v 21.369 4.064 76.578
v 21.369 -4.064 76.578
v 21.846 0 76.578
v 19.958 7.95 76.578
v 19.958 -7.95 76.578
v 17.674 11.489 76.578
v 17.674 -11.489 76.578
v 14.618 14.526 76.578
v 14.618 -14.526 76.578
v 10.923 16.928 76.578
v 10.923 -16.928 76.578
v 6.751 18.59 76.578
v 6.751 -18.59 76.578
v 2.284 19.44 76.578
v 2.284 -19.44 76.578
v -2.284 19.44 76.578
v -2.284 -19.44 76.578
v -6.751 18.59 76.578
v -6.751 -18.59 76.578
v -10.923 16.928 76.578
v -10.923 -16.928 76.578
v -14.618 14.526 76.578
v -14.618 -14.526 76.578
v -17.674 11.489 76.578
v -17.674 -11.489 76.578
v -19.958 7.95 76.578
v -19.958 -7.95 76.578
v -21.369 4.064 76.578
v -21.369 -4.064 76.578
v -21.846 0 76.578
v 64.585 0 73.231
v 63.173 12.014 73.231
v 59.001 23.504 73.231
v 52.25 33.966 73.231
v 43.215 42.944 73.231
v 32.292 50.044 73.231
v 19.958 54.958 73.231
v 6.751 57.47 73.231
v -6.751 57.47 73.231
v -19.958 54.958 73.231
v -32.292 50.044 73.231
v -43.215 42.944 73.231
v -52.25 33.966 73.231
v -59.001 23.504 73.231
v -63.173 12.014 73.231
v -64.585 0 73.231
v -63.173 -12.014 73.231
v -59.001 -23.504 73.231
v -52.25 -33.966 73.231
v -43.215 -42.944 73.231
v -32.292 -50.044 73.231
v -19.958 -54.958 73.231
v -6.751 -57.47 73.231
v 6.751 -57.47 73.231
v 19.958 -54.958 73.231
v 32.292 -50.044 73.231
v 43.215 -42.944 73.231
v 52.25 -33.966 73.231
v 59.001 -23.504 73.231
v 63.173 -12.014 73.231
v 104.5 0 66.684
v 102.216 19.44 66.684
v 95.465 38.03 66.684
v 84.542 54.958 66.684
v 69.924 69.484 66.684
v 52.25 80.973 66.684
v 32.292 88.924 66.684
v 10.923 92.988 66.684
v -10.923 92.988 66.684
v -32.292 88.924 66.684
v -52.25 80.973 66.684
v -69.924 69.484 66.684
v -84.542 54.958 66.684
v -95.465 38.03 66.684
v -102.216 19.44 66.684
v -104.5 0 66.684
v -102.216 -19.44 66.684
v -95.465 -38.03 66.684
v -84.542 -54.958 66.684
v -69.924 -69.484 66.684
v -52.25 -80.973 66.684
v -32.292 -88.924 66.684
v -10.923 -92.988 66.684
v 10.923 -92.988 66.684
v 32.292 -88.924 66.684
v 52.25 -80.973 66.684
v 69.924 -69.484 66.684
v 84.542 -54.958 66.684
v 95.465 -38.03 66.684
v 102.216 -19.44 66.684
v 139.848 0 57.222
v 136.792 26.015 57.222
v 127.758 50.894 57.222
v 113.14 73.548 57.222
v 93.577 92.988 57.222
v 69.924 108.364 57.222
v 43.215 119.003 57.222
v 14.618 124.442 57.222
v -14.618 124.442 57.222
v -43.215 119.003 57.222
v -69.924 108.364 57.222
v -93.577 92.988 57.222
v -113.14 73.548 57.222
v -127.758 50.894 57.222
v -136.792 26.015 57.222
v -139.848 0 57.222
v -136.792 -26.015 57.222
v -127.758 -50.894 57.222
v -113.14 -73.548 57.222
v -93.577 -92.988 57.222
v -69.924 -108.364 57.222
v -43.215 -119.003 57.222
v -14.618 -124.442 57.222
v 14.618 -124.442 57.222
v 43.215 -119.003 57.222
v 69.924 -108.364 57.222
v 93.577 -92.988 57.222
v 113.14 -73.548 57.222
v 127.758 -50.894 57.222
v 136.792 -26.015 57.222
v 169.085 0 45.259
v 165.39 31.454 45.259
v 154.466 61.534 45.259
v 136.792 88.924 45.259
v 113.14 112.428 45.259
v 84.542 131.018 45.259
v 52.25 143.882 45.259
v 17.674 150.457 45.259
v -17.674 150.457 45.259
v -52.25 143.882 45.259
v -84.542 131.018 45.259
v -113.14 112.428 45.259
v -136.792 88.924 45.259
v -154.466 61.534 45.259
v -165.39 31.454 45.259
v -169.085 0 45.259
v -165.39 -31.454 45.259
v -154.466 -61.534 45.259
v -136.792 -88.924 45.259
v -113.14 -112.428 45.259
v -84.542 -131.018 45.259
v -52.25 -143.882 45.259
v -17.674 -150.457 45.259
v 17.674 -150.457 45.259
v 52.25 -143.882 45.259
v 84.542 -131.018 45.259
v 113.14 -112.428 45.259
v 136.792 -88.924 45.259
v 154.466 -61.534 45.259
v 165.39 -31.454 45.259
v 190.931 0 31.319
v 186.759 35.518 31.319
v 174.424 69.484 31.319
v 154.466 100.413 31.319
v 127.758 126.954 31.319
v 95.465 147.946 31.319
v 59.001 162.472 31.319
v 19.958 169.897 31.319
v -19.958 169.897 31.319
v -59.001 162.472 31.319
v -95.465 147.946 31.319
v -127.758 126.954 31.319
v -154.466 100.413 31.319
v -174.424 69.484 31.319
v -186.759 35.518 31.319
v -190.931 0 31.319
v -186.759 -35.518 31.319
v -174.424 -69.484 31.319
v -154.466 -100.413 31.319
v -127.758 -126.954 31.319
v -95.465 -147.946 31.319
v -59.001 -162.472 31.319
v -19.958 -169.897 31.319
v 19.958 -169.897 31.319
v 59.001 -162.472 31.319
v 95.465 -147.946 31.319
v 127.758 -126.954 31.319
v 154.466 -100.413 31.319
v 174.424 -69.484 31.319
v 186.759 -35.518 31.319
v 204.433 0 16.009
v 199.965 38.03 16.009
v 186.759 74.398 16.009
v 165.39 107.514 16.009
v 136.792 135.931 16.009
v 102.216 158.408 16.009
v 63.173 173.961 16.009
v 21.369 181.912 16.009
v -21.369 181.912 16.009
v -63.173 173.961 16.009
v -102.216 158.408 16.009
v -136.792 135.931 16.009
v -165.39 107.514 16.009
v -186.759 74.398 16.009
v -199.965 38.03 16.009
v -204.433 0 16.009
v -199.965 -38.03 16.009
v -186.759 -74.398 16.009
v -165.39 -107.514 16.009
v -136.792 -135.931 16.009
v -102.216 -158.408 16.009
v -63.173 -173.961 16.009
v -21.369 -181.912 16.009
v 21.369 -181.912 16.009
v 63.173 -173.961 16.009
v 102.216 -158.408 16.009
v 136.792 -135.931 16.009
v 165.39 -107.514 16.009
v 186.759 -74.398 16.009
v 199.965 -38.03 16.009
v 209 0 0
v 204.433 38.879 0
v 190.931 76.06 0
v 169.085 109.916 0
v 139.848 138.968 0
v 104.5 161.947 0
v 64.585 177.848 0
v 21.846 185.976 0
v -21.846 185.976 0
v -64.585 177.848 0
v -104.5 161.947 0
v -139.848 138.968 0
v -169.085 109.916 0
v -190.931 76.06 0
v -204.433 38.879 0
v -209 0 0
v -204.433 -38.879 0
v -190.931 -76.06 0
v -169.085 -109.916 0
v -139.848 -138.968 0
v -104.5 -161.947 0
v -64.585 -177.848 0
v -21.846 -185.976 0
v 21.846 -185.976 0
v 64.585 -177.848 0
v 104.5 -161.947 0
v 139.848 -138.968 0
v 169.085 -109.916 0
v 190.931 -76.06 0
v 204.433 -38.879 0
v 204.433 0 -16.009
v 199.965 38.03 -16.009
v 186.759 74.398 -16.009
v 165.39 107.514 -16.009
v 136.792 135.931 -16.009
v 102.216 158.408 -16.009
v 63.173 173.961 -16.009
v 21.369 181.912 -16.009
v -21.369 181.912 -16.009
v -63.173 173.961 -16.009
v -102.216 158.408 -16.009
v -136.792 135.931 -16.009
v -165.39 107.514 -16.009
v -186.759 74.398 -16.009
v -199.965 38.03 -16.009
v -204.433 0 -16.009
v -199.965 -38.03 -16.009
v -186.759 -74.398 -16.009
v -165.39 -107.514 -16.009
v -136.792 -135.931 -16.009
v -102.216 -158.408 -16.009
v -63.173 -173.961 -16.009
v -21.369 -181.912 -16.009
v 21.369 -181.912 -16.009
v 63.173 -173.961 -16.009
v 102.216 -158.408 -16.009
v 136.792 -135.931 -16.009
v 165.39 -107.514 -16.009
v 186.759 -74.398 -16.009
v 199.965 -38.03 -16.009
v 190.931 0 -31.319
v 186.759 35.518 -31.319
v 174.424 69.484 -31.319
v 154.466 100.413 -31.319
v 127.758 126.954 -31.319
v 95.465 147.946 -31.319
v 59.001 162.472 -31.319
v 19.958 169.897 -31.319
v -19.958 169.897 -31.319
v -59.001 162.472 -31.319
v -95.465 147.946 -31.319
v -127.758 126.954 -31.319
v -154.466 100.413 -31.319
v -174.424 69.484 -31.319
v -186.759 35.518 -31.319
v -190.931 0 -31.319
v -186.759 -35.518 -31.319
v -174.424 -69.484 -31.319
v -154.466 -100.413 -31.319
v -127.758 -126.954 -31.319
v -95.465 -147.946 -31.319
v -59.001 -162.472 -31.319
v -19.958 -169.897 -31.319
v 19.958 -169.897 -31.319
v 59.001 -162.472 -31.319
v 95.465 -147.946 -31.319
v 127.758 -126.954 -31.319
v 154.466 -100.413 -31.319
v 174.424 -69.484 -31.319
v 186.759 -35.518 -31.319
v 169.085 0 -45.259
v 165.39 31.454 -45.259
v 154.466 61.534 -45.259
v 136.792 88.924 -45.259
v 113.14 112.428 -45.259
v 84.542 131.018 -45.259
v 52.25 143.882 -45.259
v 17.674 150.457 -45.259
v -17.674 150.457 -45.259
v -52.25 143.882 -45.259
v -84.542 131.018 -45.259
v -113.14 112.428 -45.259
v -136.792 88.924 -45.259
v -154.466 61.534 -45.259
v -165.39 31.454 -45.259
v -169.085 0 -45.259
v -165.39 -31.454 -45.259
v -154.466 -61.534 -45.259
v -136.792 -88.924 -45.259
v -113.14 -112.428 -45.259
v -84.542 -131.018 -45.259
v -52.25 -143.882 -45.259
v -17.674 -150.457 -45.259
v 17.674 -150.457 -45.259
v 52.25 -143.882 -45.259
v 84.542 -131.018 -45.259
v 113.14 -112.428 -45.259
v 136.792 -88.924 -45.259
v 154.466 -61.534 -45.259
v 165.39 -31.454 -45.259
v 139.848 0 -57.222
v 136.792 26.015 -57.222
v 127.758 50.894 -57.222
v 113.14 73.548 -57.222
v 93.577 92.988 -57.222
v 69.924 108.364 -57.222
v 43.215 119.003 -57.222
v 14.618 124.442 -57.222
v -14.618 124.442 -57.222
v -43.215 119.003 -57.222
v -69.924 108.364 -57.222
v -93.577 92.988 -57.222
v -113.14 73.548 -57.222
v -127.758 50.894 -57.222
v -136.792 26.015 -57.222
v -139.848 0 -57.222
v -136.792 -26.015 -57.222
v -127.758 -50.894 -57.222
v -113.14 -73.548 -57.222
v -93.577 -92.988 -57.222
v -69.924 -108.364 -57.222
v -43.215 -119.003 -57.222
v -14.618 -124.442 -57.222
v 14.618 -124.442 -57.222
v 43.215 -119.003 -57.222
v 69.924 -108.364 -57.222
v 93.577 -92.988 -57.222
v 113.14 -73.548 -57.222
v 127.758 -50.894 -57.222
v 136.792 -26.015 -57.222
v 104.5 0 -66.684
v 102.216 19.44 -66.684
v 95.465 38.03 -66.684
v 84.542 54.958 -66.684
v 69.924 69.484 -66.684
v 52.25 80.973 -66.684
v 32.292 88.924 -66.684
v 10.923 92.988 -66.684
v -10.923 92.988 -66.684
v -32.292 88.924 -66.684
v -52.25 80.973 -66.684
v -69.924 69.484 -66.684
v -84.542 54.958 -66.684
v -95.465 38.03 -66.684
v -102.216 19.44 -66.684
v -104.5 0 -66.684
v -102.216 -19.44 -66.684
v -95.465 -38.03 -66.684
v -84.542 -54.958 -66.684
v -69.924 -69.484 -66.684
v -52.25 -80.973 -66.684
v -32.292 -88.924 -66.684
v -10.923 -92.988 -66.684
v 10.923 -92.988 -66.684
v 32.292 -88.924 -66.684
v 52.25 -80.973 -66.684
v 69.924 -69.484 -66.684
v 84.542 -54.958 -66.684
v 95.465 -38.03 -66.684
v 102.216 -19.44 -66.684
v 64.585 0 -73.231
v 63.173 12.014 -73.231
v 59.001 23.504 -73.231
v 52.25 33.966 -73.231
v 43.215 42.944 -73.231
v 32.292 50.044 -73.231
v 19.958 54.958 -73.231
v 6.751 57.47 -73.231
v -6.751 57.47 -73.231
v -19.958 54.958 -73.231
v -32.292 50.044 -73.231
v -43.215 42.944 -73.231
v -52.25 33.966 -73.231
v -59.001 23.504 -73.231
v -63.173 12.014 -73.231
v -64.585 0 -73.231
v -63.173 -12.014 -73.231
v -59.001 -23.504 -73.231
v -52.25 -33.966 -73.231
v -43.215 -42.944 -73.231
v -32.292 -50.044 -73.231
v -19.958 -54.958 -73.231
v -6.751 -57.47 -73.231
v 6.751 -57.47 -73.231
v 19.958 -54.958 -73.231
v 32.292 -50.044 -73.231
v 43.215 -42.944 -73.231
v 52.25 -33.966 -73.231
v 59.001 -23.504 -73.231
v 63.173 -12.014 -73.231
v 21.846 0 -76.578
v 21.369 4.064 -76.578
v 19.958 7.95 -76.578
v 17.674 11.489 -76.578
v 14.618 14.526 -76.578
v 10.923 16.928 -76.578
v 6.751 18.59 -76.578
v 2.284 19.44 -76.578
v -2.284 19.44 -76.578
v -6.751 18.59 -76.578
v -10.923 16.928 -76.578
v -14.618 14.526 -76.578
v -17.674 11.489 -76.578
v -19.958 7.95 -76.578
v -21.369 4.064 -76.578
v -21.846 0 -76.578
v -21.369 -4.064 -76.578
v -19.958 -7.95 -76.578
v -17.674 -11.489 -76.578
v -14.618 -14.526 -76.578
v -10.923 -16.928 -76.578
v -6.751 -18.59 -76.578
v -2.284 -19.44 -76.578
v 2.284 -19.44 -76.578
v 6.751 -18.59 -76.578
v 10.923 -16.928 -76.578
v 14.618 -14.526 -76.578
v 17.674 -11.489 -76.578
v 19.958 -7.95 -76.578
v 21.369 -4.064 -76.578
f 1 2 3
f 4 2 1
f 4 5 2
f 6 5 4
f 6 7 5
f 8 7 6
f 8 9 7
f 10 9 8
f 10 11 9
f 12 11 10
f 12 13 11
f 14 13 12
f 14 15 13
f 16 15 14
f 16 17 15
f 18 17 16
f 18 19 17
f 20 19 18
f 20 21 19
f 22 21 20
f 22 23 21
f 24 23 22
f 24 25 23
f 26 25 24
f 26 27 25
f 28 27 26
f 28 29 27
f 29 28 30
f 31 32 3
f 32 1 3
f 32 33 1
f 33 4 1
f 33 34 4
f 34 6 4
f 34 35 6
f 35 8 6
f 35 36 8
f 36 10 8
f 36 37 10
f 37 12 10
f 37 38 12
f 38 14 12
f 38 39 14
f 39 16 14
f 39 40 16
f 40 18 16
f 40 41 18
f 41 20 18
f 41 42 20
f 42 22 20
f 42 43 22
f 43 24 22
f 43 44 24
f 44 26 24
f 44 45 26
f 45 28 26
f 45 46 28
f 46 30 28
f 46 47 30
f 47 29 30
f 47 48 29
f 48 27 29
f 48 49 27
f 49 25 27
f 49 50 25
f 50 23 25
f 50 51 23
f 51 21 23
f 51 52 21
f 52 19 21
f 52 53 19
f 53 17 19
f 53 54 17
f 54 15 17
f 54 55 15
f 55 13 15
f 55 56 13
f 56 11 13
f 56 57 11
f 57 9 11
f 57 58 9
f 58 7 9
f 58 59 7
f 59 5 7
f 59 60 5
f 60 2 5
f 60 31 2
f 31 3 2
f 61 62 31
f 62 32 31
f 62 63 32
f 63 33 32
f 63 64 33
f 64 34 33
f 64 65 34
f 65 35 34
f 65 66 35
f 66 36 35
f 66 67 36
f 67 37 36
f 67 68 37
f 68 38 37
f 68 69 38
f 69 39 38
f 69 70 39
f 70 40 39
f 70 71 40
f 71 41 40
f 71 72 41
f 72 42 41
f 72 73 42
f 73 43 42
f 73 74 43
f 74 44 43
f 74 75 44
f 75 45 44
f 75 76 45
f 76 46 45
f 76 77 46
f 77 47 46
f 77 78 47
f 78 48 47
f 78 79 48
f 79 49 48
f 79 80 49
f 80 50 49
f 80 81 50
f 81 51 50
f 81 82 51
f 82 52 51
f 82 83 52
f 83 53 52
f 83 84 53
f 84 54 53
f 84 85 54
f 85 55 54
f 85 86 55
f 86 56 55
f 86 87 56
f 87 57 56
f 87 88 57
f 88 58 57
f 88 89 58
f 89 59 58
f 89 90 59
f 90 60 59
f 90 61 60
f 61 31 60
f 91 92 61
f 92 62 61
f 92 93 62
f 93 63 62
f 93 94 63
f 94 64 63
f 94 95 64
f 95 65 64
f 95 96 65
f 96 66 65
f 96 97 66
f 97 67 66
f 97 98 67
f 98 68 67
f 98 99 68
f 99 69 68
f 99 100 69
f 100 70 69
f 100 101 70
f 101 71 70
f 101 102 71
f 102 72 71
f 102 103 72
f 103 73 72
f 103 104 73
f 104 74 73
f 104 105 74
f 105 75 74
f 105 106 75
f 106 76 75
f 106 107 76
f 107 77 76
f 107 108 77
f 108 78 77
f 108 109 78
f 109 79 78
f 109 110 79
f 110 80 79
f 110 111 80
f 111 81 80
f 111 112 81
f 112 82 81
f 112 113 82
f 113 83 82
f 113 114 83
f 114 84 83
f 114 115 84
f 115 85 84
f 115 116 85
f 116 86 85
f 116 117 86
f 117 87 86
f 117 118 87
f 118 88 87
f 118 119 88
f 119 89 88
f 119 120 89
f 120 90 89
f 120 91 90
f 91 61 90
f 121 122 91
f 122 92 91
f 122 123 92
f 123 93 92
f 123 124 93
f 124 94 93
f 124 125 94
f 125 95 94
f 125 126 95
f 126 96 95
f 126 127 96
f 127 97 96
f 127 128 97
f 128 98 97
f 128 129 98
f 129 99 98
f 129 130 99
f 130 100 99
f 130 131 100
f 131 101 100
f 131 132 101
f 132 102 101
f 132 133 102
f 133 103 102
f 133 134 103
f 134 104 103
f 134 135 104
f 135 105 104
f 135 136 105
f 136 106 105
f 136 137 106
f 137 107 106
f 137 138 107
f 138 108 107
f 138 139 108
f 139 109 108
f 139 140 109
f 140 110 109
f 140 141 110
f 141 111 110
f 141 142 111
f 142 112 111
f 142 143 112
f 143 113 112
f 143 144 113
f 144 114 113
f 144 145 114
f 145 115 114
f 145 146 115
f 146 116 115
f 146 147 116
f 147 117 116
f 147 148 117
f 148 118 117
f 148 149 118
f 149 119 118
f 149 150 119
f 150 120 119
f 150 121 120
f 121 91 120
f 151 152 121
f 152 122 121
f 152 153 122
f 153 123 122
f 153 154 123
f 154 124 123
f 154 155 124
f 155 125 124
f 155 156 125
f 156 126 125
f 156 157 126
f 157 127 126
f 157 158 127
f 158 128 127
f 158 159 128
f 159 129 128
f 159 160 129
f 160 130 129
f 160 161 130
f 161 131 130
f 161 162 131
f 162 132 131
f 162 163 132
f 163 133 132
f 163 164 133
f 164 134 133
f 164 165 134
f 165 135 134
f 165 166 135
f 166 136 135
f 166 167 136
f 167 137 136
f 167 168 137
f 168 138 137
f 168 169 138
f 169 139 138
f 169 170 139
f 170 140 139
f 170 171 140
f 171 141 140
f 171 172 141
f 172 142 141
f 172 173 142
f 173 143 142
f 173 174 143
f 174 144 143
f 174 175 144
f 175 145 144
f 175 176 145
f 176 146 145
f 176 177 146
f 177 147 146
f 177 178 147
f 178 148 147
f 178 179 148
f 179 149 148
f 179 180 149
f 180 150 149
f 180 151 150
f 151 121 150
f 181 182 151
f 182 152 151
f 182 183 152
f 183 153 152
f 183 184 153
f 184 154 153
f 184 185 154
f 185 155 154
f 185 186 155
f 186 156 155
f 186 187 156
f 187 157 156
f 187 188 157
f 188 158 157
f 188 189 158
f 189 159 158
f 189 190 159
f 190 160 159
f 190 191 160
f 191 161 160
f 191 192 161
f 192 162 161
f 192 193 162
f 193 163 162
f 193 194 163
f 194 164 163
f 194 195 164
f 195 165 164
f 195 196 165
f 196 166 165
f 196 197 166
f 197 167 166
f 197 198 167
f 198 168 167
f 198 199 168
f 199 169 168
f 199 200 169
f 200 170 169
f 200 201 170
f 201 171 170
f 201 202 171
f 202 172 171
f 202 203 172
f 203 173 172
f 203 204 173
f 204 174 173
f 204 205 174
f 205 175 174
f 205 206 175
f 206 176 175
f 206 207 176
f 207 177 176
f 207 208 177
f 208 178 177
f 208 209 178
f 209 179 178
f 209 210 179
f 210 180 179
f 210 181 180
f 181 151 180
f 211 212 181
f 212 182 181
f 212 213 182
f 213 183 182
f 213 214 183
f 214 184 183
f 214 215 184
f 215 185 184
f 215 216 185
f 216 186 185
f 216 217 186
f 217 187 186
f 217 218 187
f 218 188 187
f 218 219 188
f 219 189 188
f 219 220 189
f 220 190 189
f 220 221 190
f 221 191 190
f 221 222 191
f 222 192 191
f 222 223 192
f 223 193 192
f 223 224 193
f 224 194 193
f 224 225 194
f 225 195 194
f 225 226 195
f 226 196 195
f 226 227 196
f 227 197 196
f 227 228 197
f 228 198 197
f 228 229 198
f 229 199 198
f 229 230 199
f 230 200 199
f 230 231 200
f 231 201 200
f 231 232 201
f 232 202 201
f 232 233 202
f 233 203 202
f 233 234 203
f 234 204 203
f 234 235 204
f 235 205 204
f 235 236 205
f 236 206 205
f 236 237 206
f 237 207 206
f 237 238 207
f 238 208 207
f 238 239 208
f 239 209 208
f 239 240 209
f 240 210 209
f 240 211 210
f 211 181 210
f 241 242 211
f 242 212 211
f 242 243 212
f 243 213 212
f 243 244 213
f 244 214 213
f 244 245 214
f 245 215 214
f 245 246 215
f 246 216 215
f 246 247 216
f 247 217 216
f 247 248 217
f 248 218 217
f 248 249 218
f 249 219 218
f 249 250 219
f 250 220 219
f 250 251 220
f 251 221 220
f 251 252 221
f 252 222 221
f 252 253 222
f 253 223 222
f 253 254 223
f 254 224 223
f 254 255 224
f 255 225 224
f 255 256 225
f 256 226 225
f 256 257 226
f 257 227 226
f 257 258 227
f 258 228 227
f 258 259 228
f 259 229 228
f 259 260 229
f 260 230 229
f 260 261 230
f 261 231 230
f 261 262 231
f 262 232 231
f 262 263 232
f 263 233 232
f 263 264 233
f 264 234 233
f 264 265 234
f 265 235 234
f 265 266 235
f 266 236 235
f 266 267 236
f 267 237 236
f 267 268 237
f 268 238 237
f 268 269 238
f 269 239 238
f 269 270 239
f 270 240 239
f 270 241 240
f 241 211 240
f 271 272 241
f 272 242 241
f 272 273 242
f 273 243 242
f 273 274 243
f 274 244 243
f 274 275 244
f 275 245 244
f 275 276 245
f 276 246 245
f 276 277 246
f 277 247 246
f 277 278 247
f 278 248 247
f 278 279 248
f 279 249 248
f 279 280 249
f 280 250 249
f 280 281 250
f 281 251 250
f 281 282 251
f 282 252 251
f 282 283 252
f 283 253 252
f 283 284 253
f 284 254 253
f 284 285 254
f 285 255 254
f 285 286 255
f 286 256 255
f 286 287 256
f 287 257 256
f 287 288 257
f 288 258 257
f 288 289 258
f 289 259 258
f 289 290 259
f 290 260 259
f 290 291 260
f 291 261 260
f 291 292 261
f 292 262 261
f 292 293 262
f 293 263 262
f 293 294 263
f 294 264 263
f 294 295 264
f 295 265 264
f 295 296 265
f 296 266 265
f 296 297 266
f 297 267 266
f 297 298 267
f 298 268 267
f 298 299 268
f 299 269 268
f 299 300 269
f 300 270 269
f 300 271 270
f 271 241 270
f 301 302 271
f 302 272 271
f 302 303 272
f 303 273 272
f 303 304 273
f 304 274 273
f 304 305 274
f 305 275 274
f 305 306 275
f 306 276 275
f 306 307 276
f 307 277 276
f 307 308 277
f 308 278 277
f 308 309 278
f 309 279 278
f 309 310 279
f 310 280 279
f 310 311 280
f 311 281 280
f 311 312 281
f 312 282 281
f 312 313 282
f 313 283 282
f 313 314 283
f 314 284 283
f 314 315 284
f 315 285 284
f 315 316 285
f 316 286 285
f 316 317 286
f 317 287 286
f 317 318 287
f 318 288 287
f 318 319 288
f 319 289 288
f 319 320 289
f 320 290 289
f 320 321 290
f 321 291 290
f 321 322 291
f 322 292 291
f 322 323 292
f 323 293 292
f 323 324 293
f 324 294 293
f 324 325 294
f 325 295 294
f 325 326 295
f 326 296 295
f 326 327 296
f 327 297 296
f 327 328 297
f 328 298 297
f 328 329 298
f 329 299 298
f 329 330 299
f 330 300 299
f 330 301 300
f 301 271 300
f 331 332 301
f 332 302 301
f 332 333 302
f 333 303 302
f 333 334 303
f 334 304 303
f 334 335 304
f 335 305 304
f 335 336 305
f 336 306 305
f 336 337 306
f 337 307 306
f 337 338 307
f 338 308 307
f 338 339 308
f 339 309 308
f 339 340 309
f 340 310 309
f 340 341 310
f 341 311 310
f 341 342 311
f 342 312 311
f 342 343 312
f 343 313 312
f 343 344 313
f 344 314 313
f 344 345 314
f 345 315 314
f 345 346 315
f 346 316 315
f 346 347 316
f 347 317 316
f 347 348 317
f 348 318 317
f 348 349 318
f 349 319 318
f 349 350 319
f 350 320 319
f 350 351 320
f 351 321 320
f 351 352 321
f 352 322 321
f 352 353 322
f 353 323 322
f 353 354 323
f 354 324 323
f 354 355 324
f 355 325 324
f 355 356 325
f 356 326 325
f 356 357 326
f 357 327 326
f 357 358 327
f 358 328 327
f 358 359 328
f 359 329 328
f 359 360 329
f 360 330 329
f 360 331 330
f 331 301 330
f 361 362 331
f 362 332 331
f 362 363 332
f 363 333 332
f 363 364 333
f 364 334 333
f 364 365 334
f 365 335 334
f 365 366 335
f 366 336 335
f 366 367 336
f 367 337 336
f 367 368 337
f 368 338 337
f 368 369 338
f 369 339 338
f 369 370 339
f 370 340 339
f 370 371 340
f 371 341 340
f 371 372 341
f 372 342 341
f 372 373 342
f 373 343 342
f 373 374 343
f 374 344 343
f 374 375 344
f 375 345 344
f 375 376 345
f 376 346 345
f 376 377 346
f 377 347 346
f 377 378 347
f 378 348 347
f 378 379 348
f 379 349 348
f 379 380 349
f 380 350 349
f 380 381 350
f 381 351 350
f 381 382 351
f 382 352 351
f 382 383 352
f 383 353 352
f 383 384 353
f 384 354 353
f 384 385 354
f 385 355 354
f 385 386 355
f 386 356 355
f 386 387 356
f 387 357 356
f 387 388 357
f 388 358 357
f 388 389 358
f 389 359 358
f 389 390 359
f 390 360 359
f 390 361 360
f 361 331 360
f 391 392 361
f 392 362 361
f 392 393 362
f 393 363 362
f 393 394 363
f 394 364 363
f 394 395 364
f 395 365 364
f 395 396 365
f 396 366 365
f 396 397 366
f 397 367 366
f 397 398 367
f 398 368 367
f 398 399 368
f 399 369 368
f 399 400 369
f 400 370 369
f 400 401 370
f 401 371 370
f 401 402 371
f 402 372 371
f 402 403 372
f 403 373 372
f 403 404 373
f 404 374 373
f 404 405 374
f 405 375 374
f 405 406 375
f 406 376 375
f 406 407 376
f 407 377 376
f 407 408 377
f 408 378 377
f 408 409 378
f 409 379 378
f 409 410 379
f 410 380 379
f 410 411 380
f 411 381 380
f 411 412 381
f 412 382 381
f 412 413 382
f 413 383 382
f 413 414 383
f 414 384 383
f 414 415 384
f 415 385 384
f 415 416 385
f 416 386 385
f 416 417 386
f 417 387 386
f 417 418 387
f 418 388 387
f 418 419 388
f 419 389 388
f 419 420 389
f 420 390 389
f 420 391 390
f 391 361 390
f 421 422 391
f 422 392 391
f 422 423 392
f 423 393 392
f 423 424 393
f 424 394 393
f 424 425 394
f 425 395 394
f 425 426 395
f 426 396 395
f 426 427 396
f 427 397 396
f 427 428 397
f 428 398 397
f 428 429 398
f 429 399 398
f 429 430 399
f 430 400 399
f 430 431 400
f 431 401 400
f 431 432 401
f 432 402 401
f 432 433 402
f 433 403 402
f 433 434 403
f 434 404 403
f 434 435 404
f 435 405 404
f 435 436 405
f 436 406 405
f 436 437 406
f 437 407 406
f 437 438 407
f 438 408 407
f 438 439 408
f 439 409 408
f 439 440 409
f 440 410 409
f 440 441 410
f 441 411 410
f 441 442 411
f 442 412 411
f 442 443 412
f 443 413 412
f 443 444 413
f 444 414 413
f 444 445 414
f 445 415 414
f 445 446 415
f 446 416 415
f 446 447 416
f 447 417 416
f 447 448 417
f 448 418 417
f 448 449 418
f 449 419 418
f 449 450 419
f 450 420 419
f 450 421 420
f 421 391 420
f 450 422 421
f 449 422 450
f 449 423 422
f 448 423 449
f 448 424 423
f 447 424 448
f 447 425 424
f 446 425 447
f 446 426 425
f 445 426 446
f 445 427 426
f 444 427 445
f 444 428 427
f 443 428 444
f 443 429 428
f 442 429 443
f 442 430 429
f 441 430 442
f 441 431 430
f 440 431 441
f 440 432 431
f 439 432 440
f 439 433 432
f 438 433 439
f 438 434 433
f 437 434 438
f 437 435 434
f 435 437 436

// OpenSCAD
// Generated by SolidPython 1.0.1 on 2020-07-29 00:46:54


scale(v = [19, 17, 7]) {
	sphere(r = 11);
}
/***********************************************
*********      SolidPython code:      **********
************************************************
 
# import packages: SolidPython
from solid import *
from solid.utils import *
from itertools import chain, combinations, permutations


class Resize:

    def __init__(self, scad_file):
        self.scad_file = scad_file
        #self.scad_file = import_scad(scad_file)
        # cone/cylinder param:
        self.r1 = 0
        self.r2 = 0
        self.h = 0
        # rectangular prism param:
        self.w = 0
        self.l = 0
        # ellipse param:
        self.r = 0

    # import OpenScad code (file name corresponds to shape)


    # classify shape + parameters
    def assign(self, param1, param2, param3):
        if self.scad_file == 'cone.scad':
            self.r1 = param1
            self.r2 = param2
            self.h = param3
        elif self.scad_file == 'cylinder.scad':
            self.r1 = param1
            self.r2 = param2
            self.h = param3
        elif self.scad_file == 'rectangularPrism.scad':
            self.h = param1
            self.l = param2
            self.w = param3
        else:
            self.r = param1
            self.h = param2

    # resize parameters
    def iterate(self):
        x = range(3, 20, 2)
        i = 1
        if self.scad_file == 'cone.scad':
            tempList = list(permutations(x, 2))
            for temp in tempList:
                param1 = temp[0]
                param2 = temp[1]
                filepath = 'produced_scad_files/' + 'cone' + str(param1) + '_' + str(param2) + '_' + '.scad'
                scad_render_to_file(cylinder(h=param1, r1=param2, r2=0), filepath)

        elif self.scad_file == 'cylinder.scad':
            tempList = list(permutations(x, 3))
            for temp in tempList:
                param1 = temp[0]
                param2 = temp[1]
                filepath = 'produced_scad_files/' + 'cylinder' + str(param1) + '_' + str(param2) + '_' + '.scad'
                scad_render_to_file(cylinder(h=param1, r1=param2, r2=param2), filepath)

        elif self.scad_file == 'rectangularPrism.scad':
            tempList = list(permutations(x, 3))
            for temp in tempList:
                param1 = temp[0]
                param2 = temp[1]
                param3 = temp[2]
                filepath = 'produced_scad_files/' + 'rectangularPrism' + str(param1) + '_' + str(param2) + '_' + str(
                    param3) + '.scad'
                scad_render_to_file(cube(size=(param1, param2, param3)), filepath)

        elif self.scad_file == 'ellipse.scad':
            tempList = list(permutations(x, 4))
            for temp in tempList:
                param1 = temp[0]
                param2 = temp[1]
                param3 = temp[2]
                param4 = temp[3]
                filepath = 'produced_scad_files/' + 'ellipse' + str(param1) + '_' + str(param2) + '_' + str(param3) + '_' + str(param4) + '.scad'
                scad_render_to_file(scale([param1, param2, param3])(sphere(r=param4)), filepath)

    def render_to_scadfile(self):
        scad_render_to_file(scad, 'example.scad') 
 
************************************************/
